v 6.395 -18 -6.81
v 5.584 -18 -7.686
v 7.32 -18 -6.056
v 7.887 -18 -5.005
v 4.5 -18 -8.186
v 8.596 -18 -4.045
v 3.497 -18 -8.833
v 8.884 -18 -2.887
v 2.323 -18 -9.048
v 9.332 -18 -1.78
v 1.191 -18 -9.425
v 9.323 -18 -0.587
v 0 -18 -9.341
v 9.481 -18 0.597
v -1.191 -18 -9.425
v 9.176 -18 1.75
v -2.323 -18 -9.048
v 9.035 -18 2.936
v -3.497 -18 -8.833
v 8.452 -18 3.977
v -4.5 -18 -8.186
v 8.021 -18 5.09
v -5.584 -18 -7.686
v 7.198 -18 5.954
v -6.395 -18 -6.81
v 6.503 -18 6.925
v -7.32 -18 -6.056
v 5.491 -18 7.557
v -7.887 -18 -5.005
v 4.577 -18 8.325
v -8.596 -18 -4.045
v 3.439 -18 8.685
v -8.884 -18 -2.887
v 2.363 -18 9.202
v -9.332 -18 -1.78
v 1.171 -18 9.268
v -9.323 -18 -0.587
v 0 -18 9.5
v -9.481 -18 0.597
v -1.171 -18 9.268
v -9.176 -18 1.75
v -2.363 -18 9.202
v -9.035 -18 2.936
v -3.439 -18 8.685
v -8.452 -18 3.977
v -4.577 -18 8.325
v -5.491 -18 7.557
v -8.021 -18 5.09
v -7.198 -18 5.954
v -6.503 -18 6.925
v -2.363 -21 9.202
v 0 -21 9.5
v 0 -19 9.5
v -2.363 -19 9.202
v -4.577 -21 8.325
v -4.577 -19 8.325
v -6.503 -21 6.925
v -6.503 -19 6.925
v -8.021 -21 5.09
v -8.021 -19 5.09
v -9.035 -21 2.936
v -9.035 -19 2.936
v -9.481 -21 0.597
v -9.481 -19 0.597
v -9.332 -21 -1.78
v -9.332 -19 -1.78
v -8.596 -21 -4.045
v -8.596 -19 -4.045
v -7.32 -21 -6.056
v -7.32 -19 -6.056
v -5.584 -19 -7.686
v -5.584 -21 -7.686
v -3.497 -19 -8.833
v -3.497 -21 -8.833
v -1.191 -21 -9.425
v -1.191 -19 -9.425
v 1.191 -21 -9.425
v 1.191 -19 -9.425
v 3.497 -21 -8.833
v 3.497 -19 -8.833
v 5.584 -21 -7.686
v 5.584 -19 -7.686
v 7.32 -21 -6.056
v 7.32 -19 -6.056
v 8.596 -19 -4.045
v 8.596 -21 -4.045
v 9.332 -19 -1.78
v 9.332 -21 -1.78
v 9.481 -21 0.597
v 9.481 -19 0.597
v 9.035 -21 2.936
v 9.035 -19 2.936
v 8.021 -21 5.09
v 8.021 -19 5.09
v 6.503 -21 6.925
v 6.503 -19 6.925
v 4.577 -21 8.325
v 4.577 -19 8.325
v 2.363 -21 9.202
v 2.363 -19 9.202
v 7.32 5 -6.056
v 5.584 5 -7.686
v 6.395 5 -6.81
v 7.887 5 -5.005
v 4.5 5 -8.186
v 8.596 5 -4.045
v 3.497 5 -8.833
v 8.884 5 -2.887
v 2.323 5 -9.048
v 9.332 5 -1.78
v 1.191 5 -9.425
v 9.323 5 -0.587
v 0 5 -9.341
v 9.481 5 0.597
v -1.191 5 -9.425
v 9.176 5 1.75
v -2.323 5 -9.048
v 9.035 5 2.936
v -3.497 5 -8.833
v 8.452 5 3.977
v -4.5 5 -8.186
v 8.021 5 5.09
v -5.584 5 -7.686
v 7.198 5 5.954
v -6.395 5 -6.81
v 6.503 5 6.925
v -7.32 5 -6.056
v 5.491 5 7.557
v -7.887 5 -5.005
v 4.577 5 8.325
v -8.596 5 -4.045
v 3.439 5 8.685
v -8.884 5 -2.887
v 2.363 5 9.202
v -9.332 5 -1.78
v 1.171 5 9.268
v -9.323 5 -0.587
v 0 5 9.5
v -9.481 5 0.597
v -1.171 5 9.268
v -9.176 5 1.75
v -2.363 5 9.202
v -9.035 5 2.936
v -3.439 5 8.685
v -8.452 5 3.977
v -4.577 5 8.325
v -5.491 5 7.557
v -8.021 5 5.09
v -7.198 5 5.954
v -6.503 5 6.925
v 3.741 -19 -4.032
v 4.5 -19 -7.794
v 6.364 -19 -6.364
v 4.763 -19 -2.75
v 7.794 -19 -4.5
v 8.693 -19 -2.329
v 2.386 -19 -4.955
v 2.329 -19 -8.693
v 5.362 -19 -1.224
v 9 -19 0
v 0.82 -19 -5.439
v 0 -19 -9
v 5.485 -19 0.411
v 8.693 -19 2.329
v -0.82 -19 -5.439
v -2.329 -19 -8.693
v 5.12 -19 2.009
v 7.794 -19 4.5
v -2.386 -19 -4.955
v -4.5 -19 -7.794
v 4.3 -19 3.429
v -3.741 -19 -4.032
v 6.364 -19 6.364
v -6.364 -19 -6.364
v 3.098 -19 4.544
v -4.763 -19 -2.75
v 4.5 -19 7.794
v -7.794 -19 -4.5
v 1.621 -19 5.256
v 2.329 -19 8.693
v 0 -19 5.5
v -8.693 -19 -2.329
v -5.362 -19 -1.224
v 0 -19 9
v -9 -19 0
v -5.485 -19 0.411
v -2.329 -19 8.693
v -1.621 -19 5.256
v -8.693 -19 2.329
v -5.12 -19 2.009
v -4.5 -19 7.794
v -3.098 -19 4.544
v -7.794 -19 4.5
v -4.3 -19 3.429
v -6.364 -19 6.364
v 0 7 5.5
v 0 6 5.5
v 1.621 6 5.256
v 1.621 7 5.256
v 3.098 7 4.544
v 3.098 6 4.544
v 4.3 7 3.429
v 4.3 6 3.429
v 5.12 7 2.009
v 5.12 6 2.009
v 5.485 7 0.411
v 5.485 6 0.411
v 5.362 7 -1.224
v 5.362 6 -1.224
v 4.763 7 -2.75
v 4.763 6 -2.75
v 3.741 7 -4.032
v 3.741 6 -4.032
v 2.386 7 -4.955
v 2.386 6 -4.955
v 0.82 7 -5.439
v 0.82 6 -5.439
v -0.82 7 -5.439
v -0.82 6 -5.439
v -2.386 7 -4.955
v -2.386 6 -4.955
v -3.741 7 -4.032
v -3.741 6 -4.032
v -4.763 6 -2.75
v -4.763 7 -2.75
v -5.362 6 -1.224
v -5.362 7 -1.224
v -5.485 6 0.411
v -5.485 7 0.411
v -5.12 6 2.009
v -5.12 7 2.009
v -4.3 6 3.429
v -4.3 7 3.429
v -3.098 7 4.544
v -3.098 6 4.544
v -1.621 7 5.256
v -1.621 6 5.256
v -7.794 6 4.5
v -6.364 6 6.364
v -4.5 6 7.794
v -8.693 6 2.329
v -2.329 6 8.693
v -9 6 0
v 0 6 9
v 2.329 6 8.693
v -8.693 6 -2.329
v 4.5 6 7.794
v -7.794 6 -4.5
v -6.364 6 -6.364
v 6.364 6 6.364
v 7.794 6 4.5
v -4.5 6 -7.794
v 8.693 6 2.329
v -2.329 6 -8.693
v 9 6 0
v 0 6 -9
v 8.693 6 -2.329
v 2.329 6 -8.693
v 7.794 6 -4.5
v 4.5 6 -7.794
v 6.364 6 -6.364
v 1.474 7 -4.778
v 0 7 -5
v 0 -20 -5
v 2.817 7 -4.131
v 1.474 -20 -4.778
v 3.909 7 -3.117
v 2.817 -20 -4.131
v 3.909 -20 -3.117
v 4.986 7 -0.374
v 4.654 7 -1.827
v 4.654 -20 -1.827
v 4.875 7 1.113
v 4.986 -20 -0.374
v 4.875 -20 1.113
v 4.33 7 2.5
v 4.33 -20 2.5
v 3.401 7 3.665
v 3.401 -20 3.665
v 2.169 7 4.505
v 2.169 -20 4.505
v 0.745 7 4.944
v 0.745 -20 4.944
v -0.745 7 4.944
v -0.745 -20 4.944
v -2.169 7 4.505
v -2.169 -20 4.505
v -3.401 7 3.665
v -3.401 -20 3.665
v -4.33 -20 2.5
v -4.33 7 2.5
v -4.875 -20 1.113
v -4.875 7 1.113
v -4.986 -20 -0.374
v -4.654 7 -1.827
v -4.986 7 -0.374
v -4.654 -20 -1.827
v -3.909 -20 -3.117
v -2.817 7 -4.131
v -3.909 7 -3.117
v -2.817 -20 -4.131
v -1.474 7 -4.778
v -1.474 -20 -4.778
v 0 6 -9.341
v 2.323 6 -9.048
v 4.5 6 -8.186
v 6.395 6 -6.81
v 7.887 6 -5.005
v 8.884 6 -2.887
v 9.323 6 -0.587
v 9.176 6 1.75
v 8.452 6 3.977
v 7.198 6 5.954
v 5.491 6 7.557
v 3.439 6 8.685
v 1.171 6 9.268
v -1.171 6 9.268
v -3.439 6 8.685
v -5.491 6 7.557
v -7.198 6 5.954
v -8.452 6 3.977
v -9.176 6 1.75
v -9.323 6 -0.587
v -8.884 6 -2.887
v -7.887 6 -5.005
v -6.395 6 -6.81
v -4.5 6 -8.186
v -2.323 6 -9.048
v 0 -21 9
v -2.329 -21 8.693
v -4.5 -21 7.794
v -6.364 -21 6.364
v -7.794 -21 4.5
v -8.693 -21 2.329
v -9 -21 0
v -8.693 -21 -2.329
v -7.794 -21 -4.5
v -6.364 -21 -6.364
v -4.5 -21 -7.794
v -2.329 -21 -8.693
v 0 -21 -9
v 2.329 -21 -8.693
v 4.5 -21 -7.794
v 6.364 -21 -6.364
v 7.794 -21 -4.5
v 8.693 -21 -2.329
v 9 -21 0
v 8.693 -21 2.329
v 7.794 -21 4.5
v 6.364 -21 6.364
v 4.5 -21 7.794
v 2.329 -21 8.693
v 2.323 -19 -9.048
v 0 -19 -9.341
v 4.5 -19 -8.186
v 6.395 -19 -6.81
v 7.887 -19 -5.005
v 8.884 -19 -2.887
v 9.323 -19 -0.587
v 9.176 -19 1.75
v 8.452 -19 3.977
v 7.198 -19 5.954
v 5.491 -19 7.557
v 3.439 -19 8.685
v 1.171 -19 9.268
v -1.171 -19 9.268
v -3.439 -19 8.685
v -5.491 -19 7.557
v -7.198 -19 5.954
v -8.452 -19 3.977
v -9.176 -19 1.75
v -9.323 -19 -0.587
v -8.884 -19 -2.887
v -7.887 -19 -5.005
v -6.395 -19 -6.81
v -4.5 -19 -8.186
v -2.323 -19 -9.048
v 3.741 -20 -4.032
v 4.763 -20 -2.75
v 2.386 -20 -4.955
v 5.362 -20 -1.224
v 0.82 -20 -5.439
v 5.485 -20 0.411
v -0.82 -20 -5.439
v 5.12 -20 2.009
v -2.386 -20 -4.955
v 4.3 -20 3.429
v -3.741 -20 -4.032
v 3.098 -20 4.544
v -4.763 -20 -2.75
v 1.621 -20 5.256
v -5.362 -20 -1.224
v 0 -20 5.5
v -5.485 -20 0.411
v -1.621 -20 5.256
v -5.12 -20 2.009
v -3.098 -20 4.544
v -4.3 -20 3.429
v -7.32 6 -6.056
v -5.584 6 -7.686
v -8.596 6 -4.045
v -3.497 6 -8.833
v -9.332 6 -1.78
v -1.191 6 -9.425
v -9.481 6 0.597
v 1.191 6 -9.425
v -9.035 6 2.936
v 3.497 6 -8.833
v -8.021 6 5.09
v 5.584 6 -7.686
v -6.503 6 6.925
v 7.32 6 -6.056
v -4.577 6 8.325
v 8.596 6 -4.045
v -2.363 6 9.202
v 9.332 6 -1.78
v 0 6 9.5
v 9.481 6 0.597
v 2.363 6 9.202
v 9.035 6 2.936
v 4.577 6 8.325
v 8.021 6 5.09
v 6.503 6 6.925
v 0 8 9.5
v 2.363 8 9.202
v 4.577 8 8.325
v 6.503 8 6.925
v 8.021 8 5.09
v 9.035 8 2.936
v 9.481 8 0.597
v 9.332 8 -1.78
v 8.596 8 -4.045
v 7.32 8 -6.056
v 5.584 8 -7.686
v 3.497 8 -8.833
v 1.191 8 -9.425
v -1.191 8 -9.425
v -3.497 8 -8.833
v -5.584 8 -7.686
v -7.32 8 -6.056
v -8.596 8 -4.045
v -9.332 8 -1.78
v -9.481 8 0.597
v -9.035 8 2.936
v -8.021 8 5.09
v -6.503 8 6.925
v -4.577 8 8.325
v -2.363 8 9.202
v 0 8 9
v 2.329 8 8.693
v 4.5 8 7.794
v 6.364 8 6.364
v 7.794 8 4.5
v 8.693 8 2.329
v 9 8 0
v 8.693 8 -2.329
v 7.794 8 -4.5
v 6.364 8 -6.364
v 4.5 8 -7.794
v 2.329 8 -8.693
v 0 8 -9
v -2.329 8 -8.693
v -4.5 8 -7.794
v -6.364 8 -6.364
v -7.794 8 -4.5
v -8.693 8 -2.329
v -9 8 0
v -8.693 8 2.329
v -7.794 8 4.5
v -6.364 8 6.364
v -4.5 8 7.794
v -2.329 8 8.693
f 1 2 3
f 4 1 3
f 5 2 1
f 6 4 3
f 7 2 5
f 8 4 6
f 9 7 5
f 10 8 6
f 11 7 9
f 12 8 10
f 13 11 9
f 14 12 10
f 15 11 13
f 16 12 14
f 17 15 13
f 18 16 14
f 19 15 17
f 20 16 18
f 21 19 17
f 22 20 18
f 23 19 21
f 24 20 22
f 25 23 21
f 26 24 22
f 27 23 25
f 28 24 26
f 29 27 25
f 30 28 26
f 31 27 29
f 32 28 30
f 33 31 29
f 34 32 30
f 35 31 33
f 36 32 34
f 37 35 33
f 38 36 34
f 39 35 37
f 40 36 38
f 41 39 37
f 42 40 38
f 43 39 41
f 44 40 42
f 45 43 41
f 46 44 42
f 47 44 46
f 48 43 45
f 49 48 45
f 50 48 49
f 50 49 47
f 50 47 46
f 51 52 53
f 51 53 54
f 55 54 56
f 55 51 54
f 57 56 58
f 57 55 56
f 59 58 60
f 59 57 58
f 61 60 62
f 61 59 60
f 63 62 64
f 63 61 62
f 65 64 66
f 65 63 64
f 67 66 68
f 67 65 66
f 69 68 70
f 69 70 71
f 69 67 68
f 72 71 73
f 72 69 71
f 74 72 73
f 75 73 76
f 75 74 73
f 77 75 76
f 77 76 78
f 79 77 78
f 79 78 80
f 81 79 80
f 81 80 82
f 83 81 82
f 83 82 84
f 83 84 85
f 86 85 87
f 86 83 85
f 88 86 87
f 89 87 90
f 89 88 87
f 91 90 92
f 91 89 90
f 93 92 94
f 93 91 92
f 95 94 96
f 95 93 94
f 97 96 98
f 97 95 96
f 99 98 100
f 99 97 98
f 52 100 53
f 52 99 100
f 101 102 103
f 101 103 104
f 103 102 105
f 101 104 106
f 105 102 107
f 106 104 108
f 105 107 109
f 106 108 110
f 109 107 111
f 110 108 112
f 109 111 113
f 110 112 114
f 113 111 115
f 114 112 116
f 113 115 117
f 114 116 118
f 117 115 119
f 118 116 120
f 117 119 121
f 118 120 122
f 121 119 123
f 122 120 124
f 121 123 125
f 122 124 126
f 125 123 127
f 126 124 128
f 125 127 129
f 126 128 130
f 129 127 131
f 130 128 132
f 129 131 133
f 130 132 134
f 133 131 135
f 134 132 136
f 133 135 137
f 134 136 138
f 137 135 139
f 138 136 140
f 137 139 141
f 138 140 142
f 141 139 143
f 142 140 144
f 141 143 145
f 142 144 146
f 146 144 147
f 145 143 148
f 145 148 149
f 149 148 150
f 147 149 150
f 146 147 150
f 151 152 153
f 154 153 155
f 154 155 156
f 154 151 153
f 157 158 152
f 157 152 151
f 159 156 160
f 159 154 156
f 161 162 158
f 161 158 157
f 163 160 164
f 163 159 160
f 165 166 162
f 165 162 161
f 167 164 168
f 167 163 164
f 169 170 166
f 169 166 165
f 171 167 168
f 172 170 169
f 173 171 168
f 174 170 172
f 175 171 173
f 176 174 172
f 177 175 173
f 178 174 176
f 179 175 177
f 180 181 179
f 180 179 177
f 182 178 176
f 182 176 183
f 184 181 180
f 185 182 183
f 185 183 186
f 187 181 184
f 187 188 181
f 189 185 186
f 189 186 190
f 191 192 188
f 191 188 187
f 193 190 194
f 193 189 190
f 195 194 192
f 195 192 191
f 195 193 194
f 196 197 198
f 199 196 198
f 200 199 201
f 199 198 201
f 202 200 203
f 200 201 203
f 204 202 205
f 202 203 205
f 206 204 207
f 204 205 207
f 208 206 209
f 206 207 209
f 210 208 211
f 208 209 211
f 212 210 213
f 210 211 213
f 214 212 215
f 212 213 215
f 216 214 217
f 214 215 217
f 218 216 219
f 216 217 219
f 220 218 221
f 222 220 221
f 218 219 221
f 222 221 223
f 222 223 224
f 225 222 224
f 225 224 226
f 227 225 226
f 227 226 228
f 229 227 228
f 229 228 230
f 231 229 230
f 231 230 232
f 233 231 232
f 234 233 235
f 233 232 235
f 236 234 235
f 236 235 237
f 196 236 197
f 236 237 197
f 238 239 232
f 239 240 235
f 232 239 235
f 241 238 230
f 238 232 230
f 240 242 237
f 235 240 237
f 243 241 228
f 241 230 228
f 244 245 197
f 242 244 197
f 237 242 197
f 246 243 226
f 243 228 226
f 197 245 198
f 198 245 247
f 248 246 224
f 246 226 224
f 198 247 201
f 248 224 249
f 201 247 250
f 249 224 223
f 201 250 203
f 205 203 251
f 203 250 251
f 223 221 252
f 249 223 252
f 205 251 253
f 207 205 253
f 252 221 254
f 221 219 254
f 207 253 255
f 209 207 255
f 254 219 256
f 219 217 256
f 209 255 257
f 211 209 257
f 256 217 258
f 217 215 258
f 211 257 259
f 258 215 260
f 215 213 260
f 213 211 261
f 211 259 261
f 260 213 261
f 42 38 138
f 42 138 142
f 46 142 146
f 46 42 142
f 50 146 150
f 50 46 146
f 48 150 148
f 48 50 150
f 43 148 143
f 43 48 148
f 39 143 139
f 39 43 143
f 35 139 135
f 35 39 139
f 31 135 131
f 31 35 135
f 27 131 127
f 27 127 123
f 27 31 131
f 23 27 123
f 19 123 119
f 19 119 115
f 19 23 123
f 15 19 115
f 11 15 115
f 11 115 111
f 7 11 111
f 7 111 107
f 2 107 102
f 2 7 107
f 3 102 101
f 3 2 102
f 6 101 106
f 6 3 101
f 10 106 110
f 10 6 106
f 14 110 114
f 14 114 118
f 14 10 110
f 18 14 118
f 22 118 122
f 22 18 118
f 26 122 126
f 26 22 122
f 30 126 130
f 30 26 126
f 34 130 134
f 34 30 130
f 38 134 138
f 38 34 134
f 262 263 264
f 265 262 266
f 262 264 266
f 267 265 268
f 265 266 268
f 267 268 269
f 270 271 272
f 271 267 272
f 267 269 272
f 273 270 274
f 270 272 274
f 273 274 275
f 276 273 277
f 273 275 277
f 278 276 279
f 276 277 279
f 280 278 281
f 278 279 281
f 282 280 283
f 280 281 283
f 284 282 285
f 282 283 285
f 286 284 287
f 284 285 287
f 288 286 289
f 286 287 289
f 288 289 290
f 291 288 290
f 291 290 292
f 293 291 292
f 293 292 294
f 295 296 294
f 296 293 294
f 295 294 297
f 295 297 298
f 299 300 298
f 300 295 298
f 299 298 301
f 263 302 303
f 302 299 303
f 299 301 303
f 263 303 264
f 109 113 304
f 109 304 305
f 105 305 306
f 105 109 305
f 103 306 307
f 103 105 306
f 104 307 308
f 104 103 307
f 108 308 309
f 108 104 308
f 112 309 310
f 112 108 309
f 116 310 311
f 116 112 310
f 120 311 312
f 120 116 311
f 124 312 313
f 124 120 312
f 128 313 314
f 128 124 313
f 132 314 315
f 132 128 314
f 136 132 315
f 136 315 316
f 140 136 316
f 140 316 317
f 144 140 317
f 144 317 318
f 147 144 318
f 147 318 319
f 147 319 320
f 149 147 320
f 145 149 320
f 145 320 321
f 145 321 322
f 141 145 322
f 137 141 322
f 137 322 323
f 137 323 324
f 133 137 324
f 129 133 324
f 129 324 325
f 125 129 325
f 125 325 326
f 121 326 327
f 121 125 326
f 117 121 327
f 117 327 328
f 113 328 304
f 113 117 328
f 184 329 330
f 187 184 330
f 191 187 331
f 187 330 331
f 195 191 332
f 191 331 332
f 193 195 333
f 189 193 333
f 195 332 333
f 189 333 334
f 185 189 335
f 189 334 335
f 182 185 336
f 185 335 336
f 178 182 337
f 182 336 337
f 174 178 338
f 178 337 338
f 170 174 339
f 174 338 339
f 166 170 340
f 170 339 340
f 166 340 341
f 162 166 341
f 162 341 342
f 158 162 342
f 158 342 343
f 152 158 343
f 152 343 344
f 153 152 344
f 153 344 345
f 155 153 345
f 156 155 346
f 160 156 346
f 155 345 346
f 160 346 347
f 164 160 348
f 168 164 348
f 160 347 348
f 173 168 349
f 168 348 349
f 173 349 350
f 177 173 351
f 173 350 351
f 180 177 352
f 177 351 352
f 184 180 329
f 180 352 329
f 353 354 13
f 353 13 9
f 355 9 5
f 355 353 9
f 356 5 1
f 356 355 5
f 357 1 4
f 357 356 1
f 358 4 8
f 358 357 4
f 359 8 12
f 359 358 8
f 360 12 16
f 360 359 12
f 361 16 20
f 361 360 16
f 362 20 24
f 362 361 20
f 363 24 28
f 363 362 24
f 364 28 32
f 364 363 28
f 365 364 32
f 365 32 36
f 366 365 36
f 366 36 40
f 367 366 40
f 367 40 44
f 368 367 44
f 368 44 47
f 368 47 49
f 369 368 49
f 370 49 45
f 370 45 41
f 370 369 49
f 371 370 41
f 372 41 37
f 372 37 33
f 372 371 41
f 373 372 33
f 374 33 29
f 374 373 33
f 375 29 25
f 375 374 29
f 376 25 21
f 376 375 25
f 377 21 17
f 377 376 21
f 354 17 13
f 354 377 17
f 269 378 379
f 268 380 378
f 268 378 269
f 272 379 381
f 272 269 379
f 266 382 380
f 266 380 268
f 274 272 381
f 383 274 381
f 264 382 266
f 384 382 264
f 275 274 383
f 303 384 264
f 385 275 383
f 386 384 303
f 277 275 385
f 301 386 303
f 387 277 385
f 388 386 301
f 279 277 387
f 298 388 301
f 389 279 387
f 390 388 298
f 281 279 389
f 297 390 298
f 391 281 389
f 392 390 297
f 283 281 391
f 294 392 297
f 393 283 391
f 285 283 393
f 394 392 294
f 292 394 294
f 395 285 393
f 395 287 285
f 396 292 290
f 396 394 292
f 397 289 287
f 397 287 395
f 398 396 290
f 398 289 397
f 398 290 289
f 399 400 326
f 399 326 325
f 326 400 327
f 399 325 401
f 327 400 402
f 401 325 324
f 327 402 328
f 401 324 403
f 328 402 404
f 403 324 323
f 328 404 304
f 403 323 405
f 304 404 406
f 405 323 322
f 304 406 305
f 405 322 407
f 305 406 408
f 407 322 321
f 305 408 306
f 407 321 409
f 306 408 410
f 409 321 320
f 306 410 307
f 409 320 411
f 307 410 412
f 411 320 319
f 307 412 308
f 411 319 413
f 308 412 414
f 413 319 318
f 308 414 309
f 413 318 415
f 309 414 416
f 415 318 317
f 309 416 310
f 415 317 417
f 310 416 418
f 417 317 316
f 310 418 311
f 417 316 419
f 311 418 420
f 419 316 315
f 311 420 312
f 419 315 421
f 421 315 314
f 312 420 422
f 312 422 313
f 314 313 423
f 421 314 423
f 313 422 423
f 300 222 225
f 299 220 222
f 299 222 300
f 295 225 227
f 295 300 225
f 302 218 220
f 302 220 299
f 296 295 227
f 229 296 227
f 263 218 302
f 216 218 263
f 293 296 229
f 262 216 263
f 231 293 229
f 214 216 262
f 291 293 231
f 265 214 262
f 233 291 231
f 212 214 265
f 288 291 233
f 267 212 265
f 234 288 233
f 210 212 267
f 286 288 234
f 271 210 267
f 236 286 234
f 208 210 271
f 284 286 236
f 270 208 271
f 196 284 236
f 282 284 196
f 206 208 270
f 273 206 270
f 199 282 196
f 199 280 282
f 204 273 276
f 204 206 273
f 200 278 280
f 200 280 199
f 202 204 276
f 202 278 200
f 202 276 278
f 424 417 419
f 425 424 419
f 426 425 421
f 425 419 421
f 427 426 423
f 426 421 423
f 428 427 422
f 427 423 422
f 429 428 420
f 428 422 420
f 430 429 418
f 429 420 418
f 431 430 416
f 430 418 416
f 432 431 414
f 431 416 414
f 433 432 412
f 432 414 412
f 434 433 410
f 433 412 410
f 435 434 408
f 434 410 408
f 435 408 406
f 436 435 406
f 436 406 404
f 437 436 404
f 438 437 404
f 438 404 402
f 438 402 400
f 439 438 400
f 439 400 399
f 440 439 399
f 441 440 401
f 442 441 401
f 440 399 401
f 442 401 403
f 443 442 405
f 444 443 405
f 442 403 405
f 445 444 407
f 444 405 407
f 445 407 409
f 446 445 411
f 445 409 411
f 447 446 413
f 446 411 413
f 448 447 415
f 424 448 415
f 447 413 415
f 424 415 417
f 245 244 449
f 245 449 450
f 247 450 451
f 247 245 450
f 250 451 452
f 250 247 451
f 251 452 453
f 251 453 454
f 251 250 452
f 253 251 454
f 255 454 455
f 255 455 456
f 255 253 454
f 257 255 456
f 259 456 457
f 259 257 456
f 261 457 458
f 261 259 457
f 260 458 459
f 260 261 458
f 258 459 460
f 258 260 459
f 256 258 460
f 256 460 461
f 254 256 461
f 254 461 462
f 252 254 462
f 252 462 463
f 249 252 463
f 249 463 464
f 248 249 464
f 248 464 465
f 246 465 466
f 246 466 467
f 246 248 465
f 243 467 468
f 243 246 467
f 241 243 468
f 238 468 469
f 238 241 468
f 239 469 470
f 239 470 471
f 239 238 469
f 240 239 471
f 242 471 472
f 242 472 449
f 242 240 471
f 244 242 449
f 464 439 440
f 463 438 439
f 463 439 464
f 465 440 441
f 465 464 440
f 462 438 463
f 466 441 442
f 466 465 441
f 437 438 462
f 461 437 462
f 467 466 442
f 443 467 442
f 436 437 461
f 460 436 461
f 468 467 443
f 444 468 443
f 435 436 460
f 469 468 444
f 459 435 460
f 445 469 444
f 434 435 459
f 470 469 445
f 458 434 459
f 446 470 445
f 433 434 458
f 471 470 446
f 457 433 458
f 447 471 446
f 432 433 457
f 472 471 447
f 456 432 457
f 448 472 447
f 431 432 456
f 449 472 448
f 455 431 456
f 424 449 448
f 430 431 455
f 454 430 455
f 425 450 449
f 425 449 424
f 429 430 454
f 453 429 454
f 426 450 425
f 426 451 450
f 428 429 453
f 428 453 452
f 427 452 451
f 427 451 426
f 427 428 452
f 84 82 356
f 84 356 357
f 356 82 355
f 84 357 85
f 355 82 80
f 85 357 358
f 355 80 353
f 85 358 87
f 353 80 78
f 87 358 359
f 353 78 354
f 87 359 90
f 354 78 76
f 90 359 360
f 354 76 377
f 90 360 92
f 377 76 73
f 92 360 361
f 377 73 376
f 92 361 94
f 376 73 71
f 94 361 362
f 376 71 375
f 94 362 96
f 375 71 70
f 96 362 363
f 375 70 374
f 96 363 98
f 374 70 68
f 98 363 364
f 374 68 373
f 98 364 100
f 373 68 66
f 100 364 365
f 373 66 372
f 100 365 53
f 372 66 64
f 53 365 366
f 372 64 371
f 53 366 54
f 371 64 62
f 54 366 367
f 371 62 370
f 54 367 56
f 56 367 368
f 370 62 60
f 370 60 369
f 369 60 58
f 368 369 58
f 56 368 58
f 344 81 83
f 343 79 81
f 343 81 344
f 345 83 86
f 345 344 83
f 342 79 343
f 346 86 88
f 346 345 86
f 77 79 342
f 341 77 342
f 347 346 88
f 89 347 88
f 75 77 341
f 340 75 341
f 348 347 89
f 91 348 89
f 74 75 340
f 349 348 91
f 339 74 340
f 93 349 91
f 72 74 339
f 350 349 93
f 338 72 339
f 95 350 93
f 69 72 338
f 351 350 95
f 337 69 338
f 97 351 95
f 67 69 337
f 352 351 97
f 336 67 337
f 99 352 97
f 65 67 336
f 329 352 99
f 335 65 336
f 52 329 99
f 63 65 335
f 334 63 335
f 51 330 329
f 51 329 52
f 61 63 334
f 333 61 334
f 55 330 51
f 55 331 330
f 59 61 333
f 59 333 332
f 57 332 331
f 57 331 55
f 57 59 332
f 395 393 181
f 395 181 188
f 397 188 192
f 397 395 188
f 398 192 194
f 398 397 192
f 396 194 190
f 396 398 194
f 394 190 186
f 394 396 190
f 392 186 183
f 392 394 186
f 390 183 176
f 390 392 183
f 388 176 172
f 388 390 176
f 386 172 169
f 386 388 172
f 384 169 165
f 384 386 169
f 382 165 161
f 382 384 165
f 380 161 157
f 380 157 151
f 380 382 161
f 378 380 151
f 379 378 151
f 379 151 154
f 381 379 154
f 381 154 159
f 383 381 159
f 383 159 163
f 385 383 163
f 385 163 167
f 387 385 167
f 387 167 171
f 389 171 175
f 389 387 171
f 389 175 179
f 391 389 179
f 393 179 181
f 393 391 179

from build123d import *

# Parameters (mm, degrees)
SKETCH1_R            = 5.484091061
SKETCH1_R_2          = 5
BOSS_EXTRUDE1_DEPTH  = 6
SKETCH2_R            = 9.5
SKETCH2_R_2          = 9
BOSS_EXTRUDE2_DEPTH  = 2
SKETCH3_R            = 9.341445955
BOSS_EXTRUDE5_DEPTH  = 6
SKETCH4_R            = 9.341445955
CUT_EXTRUDE1_DEPTH   = 5
BOSS_EXTRUDE7_START  = 23
SKETCH5_R            = 9.5
BOSS_EXTRUDE7_DEPTH  = 23
BOSS_EXTRUDE8_START  = 1
SKETCH7_R            = 9.341445955
BOSS_EXTRUDE8_DEPTH  = 1
BOSS_EXTRUDE9_START  = 2
SKETCH8_R            = 9.5
BOSS_EXTRUDE9_DEPTH  = 2
SKETCH9_R            = 5
CUT_EXTRUDE2_DEPTH   = 29
SKETCH10_R           = 9
SKETCH10_R_2         = 5
CUT_EXTRUDE3_DEPTH   = 2
SKETCH11_R           = 5.5
SKETCH11_R_2         = 5
BOSS_EXTRUDE10_DEPTH = 1
BOSS_EXTRUDE11_START = 1
SKETCH12_R           = 5.5
SKETCH12_R_2         = 5
BOSS_EXTRUDE11_DEPTH = 1


with BuildPart() as part:
    # Sketch1 → Boss-Extrude1 (new body)
    with BuildSketch(Plane(origin=(0, 0, 0), x_dir=(1, 0, 0), z_dir=(0, 1, 0))):
        with Locations(Location((0, 0, 0), (0, 0, 270))):
            Circle(SKETCH1_R)
        with Locations(Location((0, 0, 0), (0, 0, 270))):
            Circle(SKETCH1_R_2, mode=Mode.SUBTRACT)
    extrude(amount=BOSS_EXTRUDE1_DEPTH)



with BuildPart() as body_2:
    # Sketch2 → Boss-Extrude2 (new body)
    with BuildSketch(Plane(origin=(0, 6, 0), x_dir=(1, 0, 0), z_dir=(0, 1, 0))):
        with Locations(Location((0, 0, 0), (0, 0, 270))):
            Circle(SKETCH2_R)
        with Locations(Location((0, 0, 0), (0, 0, 270))):
            Circle(SKETCH2_R_2, mode=Mode.SUBTRACT)
    extrude(amount=BOSS_EXTRUDE2_DEPTH)


with BuildPart() as part_1:
    add(part.part)

    add(body_2.part)  # Boss-Extrude5 merges body 2
    # Sketch3 → Boss-Extrude5 (add)
    with BuildSketch(Plane.XZ):
        with Locations(Location((0, 0, 0), (0, 0, 270))):
            Circle(SKETCH3_R)
    extrude(amount=-BOSS_EXTRUDE5_DEPTH)

    # Sketch4 → Cut-Extrude1 (cut)
    with BuildSketch(Plane.XZ):
        with Locations(Location((0, 0, 0), (0, 0, 270))):
            Circle(SKETCH4_R)
    extrude(amount=-CUT_EXTRUDE1_DEPTH, mode=Mode.SUBTRACT)

    # Sketch5 → Boss-Extrude7 (add)
    with BuildSketch(Plane.XZ.offset(-5).offset(BOSS_EXTRUDE7_START)):
        with Locations(Location((0, 0, 0), (0, 0, 90))):
            Circle(SKETCH5_R)
    extrude(amount=-BOSS_EXTRUDE7_DEPTH)

    # Sketch7 → Boss-Extrude8 (add)
    with BuildSketch(Plane.XZ.offset(18).offset(BOSS_EXTRUDE8_START)):
        with Locations(Location((0, 0, 0), (0, 0, 270))):
            Circle(SKETCH7_R)
    extrude(amount=-BOSS_EXTRUDE8_DEPTH)

    # Sketch8 → Boss-Extrude9 (add)
    with BuildSketch(Plane.XZ.offset(19).offset(BOSS_EXTRUDE9_START)):
        with Locations(Location((0, 0, 0), (0, 0, 90))):
            Circle(SKETCH8_R)
    extrude(amount=-BOSS_EXTRUDE9_DEPTH)

    # Sketch9 → Cut-Extrude2 (cut)
    with BuildSketch(Plane.XZ.offset(21)):
        with Locations(Location((0, 0, 0), (0, 0, 270))):
            Circle(SKETCH9_R)
    extrude(amount=-CUT_EXTRUDE2_DEPTH, mode=Mode.SUBTRACT)

    # Sketch10 → Cut-Extrude3 (cut)
    with BuildSketch(Plane.XZ.offset(21)):
        with Locations(Location((0, 0, 0), (0, 0, 90))):
            Circle(SKETCH10_R)
        with Locations(Location((0, 0, 0), (0, 0, 270))):
            Circle(SKETCH10_R_2, mode=Mode.SUBTRACT)
    extrude(amount=-CUT_EXTRUDE3_DEPTH, mode=Mode.SUBTRACT)

    # Sketch11 → Boss-Extrude10 (add)
    with BuildSketch(Plane(origin=(0, 6, 0), x_dir=(1, 0, 0), z_dir=(0, 1, 0))):
        with Locations(Location((0, 0, 0), (0, 0, 270))):
            Circle(SKETCH11_R)
        with Locations(Location((0, 0, 0), (0, 0, 90))):
            Circle(SKETCH11_R_2, mode=Mode.SUBTRACT)
    extrude(amount=BOSS_EXTRUDE10_DEPTH)

    # Sketch12 → Boss-Extrude11 (add)
    with BuildSketch(Plane.XZ.offset(19).offset(BOSS_EXTRUDE11_START)):
        with Locations(Location((0, 0, 0), (0, 0, 90))):
            Circle(SKETCH12_R)
        with Locations(Location((0, 0, 0), (0, 0, 270))):
            Circle(SKETCH12_R_2, mode=Mode.SUBTRACT)
    extrude(amount=-BOSS_EXTRUDE11_DEPTH)


solid = part_1.part
